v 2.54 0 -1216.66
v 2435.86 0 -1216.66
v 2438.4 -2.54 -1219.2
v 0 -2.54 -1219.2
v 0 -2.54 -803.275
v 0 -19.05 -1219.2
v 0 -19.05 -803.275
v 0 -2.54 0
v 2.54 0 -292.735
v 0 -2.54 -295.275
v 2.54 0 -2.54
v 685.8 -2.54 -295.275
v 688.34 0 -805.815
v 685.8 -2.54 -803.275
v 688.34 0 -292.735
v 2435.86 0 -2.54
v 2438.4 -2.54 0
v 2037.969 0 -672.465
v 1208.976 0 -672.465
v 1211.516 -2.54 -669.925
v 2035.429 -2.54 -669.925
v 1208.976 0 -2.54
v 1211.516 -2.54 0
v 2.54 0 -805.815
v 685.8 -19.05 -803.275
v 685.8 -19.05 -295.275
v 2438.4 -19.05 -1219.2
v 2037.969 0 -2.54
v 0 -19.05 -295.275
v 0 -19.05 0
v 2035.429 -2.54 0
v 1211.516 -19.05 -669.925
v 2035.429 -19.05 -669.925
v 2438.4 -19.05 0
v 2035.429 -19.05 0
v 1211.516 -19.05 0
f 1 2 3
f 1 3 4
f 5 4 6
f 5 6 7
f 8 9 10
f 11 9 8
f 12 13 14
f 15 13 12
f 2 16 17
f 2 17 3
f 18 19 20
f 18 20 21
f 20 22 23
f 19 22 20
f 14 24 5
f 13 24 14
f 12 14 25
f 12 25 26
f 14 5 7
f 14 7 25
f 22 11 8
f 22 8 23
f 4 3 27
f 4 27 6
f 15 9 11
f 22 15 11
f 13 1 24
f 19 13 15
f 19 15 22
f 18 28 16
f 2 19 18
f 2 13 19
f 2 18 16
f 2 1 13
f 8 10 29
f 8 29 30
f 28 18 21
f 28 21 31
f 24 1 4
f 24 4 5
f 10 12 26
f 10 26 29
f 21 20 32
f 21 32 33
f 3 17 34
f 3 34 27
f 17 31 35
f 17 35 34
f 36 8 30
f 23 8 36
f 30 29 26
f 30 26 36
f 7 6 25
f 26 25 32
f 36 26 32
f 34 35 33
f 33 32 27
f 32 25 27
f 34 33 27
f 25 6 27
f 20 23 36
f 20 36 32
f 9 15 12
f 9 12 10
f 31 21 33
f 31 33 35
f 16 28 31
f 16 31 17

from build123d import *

# Parameters (mm, degrees)
BOSS_EXTRUDE1_DEPTH = 19.05
CHAMFER1_SIZE       = 2.54


with BuildPart() as part:
    # Sketch1 → Boss-Extrude1 (new body)
    with BuildSketch(Plane(origin=(0, 0, 0), x_dir=(1, 0, 0), z_dir=(0, 1, 0))):
        Polygon((1211.5165, 0), (1211.5165, 669.925), (2035.429, 669.925), (2035.429, 0), (2438.4, 0), (2438.4, 1219.2), (0, 1219.2), (0, 803.275), (685.8, 803.275), (685.8, 295.275), (0, 295.275), (0, 0), align=None)
    extrude(amount=-BOSS_EXTRUDE1_DEPTH)

    # Chamfer1
    chamfer1_edges = [part.edges().sort_by_distance(p)[0] for p in [
        (0, 0, -147.6375),
        (342.9, 0, -295.275),
        (685.8, 0, -549.275),
        (342.9, 0, -803.275),
        (0, 0, -1011.2375),
        (1219.2, 0, -1219.2),
        (2438.4, 0, -609.6),
        (2236.9145, 0, 0),
        (2035.429, 0, -334.9625),
        (1623.47275, 0, -669.925),
        (1211.5165, 0, -334.9625),
        (605.75825, 0, 0),
    ]]
    chamfer(chamfer1_edges, length=CHAMFER1_SIZE)


solid = part.part
